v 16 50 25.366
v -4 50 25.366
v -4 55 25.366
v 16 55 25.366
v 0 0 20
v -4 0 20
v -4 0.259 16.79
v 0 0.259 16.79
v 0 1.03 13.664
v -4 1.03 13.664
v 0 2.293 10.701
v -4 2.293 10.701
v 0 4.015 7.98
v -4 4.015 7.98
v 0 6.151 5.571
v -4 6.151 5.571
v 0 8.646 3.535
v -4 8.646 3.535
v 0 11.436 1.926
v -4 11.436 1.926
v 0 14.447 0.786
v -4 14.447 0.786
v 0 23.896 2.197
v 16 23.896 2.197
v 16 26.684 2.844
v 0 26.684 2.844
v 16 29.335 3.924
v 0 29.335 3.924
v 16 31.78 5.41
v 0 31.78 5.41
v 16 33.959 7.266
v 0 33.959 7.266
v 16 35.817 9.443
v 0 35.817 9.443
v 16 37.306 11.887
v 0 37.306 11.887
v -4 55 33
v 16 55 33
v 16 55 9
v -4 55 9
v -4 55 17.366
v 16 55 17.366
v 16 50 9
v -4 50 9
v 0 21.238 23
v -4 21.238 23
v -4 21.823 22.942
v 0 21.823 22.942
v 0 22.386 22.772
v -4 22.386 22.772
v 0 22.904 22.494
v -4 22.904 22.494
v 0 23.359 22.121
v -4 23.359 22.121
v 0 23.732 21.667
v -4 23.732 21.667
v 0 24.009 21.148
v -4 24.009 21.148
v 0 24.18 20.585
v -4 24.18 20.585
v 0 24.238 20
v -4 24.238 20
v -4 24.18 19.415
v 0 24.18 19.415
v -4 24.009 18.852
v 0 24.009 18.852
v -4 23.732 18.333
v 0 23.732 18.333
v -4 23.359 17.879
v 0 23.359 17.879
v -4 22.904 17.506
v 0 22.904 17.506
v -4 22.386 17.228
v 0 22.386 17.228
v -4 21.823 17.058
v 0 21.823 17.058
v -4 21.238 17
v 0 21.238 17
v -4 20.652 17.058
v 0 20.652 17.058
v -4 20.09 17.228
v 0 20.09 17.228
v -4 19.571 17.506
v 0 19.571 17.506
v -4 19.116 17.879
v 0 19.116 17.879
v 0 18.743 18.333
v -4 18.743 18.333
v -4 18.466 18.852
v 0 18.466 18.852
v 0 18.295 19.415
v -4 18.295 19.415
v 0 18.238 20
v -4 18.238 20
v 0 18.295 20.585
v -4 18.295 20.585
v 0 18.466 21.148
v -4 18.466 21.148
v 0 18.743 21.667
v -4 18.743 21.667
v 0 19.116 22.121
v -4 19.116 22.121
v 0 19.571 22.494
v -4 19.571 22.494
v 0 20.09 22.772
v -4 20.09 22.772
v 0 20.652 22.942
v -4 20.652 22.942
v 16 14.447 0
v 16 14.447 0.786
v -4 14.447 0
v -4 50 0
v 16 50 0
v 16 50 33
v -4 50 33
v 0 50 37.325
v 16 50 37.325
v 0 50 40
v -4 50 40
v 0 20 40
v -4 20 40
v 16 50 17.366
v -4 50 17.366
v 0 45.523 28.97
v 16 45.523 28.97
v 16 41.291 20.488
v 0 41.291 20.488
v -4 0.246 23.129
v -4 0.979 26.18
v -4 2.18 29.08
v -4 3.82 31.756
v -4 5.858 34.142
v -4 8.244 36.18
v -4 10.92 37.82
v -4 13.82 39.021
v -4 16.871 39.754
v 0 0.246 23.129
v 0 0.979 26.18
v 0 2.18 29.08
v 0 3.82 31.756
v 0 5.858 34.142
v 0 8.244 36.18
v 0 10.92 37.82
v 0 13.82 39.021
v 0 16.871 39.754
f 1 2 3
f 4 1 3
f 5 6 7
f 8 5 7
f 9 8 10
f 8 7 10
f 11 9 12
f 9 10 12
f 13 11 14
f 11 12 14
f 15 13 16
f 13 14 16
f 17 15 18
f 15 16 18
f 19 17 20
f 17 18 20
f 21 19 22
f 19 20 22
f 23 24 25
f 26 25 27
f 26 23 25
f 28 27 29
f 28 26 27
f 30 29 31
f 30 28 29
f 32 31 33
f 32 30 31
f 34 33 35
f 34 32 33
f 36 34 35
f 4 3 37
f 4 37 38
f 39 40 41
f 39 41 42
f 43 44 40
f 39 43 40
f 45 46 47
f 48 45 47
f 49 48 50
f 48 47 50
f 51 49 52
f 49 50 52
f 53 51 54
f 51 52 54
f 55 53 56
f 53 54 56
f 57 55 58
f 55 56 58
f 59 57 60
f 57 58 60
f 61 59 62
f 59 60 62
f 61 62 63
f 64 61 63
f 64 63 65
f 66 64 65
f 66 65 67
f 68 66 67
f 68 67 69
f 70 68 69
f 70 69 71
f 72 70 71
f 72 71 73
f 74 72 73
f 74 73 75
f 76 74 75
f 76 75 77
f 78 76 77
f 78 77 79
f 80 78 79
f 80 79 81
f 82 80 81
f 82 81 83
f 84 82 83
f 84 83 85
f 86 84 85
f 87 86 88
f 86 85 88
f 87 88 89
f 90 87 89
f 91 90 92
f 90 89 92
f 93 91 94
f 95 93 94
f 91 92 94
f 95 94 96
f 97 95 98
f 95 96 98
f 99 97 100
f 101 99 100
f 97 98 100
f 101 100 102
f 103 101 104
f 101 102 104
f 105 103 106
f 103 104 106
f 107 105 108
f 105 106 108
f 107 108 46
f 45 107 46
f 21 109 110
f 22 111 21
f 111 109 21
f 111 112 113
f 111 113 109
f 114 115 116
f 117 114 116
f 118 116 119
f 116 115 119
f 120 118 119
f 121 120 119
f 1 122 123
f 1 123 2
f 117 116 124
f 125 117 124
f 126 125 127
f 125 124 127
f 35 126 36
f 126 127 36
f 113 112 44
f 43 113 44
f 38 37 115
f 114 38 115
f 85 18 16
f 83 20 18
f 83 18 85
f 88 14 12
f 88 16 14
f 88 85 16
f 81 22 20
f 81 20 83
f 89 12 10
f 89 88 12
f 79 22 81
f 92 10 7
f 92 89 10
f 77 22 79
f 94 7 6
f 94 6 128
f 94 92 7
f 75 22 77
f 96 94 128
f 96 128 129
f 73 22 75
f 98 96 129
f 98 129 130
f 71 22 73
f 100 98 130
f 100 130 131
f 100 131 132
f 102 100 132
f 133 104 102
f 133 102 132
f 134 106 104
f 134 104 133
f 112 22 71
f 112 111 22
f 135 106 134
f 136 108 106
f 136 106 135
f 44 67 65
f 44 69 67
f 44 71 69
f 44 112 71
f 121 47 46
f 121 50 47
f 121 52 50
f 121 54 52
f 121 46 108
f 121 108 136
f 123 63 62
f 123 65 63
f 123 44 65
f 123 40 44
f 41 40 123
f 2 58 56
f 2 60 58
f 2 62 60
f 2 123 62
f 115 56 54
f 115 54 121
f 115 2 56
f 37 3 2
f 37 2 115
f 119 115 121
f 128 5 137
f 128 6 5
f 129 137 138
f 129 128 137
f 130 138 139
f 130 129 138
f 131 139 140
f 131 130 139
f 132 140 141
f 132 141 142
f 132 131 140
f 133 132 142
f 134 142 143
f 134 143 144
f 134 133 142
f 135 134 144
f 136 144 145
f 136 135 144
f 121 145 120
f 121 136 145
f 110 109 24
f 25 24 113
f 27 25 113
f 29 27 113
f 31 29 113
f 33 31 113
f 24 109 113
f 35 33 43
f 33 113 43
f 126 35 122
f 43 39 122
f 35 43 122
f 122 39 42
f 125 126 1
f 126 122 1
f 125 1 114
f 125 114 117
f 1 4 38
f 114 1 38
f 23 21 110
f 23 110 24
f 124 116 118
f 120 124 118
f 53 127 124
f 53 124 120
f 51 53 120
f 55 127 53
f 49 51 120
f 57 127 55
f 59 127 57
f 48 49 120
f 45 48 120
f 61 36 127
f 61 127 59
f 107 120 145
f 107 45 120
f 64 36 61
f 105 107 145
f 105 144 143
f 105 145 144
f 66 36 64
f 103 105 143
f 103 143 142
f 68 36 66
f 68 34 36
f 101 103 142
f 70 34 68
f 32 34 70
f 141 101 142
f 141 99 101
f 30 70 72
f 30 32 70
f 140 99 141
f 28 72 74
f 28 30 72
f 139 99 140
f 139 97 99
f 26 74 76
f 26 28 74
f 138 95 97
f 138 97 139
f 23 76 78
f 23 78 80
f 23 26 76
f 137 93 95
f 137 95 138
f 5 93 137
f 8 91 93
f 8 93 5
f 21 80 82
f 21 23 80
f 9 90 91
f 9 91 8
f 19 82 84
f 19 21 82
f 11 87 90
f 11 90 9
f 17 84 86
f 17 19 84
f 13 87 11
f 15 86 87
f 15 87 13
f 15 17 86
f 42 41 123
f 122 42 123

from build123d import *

# Parameters (mm, degrees)
DODANIE_WYCI_GNI_CIE1_DEPTH = 40
ZAOKR_GLENIE1_R             = 20
DODANIE_WYCI_GNI_CIE2_DEPTH = 20
SZKIC6_R                    = 3
WYTNIJ_WYCI_GNI_CIE1_DEPTH  = 10
WYTNIJ_WYCI_GNI_CIE2_DEPTH  = 71.887234394


with BuildPart() as part:
    # Szkic1 → Dodanie-wyciągnięcie1 (new body)
    with BuildSketch(Plane.XY):
        Polygon((0, 0), (-4, 0), (-4, 55), (16, 55), (16, 51.5), (0, 51.5), align=None)
    extrude(amount=DODANIE_WYCI_GNI_CIE1_DEPTH)

    # Zaokrąglenie1
    zaokr_glenie1_edges = [part.edges().sort_by_distance(p)[0] for p in [
        (-2, 0, 0),
        (-2, 0, 40),
    ]]
    fillet(zaokr_glenie1_edges, radius=ZAOKR_GLENIE1_R - 0.0001)  # a hair under: the kernel refuses the full size

    # Szkic5 → Dodanie-wyciągnięcie2 (add)
    with BuildSketch(Plane.ZY.offset(4)):
        with BuildLine():
            ThreePointArc((0.786266298, 14.447303609), (0.197542147, 17.19595596), (0, 20))
            Line((0, 20), (0, 14.447303609))
            Line((0, 14.447303609), (0.786266298, 14.447303609))
        make_face()
        with BuildLine():
            Line((40, 51.5), (0, 51.5))
            Line((0, 51.5), (0, 20))
            ThreePointArc((0, 20), (0.197542147, 17.19595596), (0.786266298, 14.447303609))
            Line((0.786266298, 14.447303609), (2.19744111, 23.896337815))
            ThreePointArc((2.19744111, 23.896337815), (5.410467594, 31.78015679), (11.887142793, 37.30562683))
            Line((11.887142793, 37.30562683), (40, 51.5))
        make_face()
        with BuildLine():
            ThreePointArc((40, 51.5), (26.114639544, 44.064002088), (11.887142793, 37.30562683))
            Line((11.887142793, 37.30562683), (40, 51.5))
        make_face()
    extrude(amount=-DODANIE_WYCI_GNI_CIE2_DEPTH)

    # Szkic6 → Wytnij-wyciągnięcie1 (cut)
    with BuildSketch(Plane.ZY.offset(4)):
        with Locations((20, 21.237598079)):
            Circle(SZKIC6_R)
    extrude(amount=-WYTNIJ_WYCI_GNI_CIE1_DEPTH, mode=Mode.SUBTRACT)

    # Szkic8 → Wytnij-wyciągnięcie2 (cut, through all)
    with BuildSketch(Plane.ZY.offset(4)):
        Polygon((0, 50), (9, 50), (9, 55), (17.366037593, 55), (17.366037593, 50), (25.366037593, 50), (25.366037593, 55), (33, 55), (33, 50), (40, 50), (40, 57.074314744), (0, 57.074314744), align=None)
    extrude(amount=-WYTNIJ_WYCI_GNI_CIE2_DEPTH, mode=Mode.SUBTRACT)


solid = part.part
